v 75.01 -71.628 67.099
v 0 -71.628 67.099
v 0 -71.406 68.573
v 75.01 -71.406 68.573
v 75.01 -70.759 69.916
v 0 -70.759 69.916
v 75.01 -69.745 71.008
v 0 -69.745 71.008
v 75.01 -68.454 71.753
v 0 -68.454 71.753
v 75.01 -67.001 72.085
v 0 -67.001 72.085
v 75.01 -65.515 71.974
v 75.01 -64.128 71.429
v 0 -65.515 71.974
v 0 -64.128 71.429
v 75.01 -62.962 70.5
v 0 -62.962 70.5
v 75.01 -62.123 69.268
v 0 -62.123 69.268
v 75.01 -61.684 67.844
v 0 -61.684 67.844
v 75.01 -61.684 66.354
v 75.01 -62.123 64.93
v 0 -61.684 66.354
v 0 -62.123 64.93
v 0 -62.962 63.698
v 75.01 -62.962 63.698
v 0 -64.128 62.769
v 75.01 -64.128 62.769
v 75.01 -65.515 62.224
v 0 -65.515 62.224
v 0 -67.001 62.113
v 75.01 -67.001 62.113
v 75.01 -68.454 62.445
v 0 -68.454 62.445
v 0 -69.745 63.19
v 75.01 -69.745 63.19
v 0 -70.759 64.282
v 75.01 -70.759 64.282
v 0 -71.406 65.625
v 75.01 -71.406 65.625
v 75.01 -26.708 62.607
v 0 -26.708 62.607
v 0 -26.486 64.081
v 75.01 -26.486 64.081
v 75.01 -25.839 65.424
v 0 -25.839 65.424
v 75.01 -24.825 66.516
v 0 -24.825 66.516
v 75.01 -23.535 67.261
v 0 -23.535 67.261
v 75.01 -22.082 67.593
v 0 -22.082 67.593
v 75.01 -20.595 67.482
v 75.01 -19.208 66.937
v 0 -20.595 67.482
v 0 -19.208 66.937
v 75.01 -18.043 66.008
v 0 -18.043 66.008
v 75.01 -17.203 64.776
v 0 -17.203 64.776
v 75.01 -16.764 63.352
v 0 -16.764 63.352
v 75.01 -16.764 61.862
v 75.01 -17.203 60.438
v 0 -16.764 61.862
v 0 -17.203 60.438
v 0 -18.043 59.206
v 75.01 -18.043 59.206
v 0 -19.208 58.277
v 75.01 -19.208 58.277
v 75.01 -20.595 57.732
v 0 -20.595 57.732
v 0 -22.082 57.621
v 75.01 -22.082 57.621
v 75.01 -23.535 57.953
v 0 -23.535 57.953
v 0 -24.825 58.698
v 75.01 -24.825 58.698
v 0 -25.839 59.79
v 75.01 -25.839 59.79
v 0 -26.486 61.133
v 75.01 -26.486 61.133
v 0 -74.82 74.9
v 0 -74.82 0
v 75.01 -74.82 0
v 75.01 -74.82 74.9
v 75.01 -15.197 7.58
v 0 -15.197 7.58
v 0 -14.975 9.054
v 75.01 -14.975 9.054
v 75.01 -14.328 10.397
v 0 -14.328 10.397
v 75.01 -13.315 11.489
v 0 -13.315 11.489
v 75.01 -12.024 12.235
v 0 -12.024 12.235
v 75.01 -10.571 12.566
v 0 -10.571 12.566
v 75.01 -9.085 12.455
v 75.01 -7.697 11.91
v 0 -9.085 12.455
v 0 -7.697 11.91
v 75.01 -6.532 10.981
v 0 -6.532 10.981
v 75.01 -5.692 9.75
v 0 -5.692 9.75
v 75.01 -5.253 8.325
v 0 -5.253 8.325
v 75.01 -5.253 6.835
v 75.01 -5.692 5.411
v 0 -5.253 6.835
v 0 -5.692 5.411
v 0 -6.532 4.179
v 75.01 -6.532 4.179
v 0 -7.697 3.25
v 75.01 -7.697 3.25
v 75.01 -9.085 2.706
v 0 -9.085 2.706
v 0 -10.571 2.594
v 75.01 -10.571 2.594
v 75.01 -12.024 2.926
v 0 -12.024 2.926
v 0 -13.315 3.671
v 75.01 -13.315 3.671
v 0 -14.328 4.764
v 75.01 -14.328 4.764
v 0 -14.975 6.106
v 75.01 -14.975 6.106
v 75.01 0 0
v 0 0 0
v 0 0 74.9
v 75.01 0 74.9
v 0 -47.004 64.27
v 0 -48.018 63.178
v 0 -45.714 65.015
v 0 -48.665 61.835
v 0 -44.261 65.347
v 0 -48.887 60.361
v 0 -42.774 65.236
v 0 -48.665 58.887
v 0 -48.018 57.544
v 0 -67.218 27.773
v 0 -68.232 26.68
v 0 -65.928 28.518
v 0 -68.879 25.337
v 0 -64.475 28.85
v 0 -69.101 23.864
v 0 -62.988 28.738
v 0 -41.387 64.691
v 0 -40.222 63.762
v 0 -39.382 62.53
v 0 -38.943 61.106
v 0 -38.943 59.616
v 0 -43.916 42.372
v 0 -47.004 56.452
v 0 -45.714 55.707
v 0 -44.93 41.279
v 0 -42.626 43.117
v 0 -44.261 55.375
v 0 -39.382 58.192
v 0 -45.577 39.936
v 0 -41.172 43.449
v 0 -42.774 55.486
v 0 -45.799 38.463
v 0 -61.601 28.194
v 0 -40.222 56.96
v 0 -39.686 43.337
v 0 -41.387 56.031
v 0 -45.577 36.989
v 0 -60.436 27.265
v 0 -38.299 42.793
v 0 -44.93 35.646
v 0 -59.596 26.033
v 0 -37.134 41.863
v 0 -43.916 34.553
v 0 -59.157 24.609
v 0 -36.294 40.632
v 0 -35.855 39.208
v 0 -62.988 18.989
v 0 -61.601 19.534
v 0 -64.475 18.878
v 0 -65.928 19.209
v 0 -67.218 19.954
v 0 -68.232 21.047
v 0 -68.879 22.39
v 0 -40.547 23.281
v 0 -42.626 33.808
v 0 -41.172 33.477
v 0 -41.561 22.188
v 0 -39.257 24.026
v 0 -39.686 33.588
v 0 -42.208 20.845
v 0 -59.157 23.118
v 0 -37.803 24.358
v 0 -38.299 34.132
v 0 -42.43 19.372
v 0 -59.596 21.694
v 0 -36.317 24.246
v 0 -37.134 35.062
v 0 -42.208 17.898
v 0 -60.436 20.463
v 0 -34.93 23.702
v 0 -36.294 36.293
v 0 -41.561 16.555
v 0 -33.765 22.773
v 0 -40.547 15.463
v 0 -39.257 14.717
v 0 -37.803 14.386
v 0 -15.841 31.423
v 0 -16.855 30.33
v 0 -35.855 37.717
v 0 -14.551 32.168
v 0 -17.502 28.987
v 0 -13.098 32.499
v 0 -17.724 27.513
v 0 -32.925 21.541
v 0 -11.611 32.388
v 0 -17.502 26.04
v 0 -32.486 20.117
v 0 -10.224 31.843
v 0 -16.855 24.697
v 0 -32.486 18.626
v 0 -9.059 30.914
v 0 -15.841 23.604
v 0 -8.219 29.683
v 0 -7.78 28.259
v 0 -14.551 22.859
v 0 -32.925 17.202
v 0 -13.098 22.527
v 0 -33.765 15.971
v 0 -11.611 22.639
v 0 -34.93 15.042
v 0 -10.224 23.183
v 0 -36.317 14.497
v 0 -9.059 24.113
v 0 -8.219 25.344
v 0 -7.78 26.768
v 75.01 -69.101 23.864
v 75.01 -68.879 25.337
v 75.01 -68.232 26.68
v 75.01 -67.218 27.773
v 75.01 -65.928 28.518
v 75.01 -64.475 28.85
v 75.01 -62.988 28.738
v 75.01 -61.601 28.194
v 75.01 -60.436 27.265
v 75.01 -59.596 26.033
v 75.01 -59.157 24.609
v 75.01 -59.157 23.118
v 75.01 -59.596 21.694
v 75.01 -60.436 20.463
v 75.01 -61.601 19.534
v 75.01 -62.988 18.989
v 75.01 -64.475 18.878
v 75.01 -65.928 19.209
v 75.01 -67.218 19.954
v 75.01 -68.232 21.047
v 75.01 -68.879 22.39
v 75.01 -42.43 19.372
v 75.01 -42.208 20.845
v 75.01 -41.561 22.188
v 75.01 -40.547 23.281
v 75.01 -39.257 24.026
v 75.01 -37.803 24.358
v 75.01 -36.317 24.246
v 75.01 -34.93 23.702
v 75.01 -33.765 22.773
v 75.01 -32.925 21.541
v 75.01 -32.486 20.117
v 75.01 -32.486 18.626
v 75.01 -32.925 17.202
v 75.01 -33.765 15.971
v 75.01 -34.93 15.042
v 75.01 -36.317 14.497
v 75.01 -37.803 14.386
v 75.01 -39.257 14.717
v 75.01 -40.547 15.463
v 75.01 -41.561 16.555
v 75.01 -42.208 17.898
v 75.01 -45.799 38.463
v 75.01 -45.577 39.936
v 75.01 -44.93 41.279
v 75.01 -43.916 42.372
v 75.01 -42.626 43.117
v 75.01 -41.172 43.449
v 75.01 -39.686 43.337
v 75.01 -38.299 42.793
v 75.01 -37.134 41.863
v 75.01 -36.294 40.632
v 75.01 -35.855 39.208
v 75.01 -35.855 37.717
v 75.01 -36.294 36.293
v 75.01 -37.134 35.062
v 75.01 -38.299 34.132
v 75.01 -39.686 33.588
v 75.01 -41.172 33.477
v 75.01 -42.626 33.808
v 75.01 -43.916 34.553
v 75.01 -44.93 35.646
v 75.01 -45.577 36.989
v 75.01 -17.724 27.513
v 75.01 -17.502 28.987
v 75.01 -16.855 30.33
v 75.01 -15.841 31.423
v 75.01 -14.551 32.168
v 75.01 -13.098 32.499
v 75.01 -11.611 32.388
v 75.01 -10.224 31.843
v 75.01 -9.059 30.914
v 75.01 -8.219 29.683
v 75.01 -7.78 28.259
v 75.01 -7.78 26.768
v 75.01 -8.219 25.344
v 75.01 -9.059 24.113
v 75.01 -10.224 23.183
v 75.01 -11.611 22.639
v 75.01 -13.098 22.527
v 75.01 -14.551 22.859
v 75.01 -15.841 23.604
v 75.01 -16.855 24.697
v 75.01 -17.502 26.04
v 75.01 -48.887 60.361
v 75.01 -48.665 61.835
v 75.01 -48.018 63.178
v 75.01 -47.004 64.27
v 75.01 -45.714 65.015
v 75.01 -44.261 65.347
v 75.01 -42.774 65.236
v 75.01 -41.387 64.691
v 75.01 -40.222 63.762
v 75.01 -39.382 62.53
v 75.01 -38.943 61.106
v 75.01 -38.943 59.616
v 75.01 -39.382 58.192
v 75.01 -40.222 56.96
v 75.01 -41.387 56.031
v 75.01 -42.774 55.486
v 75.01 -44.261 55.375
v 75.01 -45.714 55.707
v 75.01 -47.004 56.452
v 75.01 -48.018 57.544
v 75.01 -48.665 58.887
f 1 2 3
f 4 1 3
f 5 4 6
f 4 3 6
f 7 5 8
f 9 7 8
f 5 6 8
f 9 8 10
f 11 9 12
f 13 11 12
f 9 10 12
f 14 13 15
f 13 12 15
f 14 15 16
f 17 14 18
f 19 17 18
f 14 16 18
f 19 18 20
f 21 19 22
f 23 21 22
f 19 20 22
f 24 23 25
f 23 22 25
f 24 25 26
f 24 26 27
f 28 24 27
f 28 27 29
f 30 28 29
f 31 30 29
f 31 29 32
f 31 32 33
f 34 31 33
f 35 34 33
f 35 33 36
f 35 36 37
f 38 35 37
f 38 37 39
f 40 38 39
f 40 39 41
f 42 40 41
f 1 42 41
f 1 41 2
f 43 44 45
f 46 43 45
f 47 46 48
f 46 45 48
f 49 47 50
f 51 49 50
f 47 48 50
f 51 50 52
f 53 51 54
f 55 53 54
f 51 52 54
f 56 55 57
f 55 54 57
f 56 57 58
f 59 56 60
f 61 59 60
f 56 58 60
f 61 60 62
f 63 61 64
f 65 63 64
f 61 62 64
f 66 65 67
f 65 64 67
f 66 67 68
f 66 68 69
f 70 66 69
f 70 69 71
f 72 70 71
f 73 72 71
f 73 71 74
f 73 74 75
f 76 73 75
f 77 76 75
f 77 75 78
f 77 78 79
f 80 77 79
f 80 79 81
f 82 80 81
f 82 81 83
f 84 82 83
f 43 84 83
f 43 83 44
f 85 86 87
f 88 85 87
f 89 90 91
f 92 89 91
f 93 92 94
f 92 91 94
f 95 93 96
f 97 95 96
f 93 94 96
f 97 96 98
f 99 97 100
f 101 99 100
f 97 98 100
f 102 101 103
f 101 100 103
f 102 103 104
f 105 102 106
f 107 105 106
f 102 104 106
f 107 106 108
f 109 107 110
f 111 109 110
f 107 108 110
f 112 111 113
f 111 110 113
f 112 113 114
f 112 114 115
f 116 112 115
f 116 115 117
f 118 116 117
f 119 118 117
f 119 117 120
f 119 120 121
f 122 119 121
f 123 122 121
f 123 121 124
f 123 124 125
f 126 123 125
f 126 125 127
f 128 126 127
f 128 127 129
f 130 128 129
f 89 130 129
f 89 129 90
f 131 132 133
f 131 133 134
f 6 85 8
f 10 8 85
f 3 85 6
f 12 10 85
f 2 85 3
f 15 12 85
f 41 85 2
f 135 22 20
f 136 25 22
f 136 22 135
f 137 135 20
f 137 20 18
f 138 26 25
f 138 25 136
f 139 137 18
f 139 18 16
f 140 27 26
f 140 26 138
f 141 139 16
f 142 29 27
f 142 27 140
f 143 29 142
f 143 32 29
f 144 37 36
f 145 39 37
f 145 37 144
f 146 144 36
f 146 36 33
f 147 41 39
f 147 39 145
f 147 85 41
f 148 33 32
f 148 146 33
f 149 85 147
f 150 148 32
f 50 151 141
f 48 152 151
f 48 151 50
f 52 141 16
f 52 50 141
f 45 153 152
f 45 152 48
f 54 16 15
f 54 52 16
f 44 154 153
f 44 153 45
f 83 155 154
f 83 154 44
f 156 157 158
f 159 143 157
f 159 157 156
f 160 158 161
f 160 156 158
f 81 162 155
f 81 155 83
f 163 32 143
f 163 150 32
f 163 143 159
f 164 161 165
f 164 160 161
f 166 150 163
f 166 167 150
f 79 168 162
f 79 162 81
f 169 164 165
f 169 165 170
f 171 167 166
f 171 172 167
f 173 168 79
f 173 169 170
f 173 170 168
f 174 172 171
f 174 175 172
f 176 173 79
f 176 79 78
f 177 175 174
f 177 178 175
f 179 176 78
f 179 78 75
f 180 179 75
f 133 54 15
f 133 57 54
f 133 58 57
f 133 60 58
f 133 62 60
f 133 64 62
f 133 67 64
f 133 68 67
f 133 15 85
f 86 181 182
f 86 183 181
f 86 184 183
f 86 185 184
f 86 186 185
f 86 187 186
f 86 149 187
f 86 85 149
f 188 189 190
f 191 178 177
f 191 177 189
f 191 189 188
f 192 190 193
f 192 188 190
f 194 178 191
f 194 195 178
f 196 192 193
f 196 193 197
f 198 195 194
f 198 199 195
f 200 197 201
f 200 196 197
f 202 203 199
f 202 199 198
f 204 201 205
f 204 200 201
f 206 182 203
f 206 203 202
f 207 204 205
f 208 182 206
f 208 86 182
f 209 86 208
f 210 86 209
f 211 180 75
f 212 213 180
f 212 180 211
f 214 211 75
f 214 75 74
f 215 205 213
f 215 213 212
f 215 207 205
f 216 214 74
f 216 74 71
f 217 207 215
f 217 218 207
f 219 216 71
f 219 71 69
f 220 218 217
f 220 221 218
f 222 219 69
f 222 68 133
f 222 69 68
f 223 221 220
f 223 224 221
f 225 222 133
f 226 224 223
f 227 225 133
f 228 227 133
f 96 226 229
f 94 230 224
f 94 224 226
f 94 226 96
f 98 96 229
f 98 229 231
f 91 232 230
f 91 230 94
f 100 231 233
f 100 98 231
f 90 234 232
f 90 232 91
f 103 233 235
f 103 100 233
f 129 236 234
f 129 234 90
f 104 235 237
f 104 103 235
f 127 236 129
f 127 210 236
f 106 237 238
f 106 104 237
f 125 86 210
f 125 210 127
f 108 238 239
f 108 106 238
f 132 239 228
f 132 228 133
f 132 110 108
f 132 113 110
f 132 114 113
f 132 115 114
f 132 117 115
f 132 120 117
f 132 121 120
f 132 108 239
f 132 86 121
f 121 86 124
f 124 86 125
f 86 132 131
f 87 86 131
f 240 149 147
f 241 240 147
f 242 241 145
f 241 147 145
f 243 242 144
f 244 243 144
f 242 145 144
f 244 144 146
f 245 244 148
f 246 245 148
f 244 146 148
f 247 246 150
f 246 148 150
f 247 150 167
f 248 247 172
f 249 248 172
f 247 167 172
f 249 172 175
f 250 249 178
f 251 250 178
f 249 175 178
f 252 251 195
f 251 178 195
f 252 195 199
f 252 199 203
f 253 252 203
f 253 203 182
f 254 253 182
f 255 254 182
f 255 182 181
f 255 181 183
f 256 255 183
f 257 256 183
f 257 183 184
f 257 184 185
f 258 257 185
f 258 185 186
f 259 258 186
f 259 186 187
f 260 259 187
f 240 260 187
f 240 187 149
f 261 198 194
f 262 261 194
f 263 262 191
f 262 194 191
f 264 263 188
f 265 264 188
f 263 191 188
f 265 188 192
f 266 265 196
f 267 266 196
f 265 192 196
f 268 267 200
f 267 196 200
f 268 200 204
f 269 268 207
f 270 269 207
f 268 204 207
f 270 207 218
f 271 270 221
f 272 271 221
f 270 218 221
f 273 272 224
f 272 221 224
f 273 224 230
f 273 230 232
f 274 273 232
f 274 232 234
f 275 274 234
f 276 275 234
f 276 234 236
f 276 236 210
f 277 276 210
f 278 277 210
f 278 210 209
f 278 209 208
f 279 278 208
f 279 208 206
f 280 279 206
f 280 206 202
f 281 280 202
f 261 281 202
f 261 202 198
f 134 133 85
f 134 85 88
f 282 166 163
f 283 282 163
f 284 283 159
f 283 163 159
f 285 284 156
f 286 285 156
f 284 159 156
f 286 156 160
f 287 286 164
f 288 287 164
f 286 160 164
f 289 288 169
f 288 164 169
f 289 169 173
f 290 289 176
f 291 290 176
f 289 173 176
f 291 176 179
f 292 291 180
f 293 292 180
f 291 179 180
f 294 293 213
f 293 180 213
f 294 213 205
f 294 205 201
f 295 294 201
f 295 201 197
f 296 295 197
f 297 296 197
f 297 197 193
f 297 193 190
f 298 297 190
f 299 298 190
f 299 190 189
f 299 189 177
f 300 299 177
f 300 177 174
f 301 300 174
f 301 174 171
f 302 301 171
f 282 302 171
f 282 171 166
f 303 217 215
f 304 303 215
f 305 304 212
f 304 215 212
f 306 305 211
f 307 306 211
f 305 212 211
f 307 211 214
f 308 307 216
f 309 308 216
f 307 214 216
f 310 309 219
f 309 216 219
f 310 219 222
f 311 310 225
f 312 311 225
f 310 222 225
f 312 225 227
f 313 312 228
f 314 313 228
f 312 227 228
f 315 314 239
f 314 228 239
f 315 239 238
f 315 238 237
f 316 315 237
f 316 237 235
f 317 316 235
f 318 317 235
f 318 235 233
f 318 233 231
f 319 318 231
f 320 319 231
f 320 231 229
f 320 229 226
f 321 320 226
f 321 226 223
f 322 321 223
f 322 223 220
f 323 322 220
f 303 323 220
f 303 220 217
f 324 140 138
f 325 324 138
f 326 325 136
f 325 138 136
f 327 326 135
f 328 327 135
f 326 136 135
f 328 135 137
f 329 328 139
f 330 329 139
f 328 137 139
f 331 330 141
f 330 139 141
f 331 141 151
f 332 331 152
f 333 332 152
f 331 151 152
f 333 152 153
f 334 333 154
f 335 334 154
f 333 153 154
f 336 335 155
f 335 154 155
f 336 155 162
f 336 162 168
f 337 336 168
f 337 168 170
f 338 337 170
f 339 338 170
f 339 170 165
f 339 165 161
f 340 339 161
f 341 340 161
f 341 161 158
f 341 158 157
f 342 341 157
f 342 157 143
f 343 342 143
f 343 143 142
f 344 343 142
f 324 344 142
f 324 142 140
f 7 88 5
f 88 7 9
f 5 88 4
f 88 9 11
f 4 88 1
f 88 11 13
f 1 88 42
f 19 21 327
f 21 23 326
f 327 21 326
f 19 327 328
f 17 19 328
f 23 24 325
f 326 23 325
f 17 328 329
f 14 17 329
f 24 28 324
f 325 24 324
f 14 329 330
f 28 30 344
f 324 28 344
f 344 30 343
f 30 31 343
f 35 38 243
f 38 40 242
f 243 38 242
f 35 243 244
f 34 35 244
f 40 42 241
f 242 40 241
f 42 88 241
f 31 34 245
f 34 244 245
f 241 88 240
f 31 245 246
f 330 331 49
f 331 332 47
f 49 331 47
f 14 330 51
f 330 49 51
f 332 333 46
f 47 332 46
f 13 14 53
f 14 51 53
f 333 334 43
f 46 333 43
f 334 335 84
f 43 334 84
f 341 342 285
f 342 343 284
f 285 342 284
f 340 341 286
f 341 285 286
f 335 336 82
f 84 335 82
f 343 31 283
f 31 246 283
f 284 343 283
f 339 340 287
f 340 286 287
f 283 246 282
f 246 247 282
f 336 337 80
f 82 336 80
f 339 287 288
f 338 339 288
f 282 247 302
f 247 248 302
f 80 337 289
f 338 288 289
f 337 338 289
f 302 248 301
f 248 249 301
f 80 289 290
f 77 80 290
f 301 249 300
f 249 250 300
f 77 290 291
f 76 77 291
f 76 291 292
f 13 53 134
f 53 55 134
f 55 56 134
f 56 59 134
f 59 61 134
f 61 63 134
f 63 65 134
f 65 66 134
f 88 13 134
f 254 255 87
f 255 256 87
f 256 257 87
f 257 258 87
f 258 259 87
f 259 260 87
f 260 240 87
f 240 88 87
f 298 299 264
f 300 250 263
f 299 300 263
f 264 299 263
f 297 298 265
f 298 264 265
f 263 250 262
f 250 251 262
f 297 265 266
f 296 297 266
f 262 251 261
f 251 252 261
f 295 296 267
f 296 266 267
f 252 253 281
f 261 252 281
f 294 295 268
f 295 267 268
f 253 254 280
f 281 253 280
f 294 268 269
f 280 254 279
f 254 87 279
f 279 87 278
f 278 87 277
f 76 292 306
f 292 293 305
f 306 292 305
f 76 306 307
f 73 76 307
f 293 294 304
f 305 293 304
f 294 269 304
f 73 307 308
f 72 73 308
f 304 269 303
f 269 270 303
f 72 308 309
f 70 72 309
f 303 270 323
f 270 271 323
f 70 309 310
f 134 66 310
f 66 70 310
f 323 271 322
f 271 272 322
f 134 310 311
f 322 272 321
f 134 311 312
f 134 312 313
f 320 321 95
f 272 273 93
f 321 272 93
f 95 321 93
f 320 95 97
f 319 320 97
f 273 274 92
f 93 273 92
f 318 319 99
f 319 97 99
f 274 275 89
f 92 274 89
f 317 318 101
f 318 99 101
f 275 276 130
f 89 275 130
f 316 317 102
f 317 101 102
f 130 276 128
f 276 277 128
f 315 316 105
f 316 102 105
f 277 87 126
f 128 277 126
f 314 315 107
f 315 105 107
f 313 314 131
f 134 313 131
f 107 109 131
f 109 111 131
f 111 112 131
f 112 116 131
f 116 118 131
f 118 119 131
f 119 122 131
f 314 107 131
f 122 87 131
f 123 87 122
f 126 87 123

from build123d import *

# Parameters (mm, degrees)
F0_W     = 75.010031
F0_H     = 74.819528
F1_DEPTH = 74.9
F3_D     = 10


with BuildPart() as f1:
    # F0 (on Top) → F1 (new body)
    with BuildSketch(Plane.XY):
        with Locations((37.505015, -37.409764)):
            Rectangle(F0_W, F0_H)
    extrude(amount=F1_DEPTH)

    # F3 (through all)
    with Locations(Plane.YZ.offset(75.010031)):
        with Locations((-21.707887, 62.606953), (-40.798798, 38.462568), (-37.429813, 19.371659), (-66.627674, 67.09893), (-43.88703, 60.360968), (-12.723929, 27.51337), (-64.100936, 23.863638), (-10.197191, 7.580214)):
            Hole(F3_D / 2)


solid = f1.part
